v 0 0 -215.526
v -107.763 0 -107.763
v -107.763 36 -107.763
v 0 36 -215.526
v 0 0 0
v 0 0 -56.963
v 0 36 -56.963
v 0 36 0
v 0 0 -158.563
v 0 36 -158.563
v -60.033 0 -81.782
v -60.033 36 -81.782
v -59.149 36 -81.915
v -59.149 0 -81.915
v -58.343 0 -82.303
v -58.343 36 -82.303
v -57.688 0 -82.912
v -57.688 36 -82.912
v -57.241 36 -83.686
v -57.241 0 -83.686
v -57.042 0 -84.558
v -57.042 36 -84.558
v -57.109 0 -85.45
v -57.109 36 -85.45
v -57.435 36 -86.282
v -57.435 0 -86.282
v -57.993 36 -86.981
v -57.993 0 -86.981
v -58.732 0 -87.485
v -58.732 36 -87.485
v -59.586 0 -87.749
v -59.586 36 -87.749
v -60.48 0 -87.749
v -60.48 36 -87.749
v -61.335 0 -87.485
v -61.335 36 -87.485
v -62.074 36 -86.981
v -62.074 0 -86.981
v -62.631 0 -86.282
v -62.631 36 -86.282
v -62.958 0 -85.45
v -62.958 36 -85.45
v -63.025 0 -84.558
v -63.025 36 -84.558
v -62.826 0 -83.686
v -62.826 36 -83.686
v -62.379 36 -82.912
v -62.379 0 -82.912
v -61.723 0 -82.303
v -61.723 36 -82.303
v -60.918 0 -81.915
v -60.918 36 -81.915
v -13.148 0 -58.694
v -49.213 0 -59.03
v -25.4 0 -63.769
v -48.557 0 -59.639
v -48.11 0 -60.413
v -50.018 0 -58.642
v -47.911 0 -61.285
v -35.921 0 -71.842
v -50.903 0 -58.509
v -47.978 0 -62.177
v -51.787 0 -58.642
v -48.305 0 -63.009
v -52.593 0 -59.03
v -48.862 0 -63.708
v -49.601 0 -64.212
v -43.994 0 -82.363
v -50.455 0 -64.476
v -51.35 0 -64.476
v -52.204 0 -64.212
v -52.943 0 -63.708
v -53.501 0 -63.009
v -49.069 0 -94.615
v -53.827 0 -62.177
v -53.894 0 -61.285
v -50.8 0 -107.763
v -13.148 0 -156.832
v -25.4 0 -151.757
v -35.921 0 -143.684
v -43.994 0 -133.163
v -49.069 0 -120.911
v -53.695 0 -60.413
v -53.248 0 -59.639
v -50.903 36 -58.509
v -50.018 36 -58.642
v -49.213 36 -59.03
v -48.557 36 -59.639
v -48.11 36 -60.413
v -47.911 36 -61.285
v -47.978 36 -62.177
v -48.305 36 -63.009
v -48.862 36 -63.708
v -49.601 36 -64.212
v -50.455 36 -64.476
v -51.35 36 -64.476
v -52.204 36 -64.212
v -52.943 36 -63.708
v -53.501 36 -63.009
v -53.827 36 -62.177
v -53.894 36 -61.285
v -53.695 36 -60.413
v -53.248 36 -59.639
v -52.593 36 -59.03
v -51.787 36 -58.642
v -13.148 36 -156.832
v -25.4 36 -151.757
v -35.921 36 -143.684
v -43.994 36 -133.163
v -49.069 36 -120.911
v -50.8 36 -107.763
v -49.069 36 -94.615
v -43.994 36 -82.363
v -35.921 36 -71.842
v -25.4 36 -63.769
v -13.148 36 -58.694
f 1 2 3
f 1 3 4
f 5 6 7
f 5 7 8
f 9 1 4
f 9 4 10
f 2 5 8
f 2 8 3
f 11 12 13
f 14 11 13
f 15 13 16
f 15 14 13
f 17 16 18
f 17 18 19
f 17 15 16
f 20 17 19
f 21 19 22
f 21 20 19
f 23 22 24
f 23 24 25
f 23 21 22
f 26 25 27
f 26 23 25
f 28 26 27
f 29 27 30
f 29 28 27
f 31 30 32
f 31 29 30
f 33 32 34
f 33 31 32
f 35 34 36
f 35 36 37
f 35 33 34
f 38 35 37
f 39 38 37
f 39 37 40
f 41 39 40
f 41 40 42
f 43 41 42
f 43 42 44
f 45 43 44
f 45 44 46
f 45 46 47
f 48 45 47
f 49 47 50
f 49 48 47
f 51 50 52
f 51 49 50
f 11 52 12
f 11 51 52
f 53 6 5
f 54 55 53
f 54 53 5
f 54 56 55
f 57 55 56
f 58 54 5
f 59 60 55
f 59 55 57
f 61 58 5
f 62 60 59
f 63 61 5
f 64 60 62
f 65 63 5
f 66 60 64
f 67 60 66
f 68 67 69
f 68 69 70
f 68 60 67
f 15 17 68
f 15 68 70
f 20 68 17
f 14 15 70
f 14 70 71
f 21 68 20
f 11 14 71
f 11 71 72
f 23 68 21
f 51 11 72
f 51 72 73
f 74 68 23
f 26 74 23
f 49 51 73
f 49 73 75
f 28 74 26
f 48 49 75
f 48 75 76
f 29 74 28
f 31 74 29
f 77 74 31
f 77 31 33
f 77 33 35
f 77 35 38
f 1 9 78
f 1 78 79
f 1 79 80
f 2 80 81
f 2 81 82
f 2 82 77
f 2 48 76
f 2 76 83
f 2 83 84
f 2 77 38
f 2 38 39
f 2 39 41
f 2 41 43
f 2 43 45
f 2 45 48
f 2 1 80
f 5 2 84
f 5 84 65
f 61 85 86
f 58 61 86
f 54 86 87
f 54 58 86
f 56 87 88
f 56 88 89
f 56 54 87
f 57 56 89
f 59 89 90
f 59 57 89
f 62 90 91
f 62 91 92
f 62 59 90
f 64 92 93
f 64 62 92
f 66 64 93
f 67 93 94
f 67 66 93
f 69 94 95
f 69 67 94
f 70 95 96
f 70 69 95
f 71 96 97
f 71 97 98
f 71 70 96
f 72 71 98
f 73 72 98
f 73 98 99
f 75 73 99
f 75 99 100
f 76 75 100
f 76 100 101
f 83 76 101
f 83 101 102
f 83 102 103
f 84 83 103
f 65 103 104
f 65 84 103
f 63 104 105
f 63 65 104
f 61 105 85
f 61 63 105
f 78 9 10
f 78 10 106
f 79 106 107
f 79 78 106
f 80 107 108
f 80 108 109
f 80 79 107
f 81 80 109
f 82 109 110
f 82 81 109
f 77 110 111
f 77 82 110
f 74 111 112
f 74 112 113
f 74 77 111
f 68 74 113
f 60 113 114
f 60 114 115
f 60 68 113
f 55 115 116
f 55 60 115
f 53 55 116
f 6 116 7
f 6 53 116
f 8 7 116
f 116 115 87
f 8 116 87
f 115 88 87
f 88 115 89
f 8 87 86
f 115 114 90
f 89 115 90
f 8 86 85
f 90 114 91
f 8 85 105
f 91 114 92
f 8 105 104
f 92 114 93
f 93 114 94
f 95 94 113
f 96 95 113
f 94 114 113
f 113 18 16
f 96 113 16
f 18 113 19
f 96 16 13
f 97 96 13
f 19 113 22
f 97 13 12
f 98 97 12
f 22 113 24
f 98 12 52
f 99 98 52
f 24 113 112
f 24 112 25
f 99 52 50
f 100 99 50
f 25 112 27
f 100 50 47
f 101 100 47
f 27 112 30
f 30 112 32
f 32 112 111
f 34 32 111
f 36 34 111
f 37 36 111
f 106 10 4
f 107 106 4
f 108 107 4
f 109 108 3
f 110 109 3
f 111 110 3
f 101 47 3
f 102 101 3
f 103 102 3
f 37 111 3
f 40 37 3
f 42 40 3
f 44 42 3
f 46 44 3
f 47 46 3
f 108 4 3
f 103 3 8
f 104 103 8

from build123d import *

# Parameters (mm, degrees)
SKETCH1_R           = 3
BOSS_EXTRUDE1_DEPTH = 36


with BuildPart() as part:
    # Sketch1 → Boss-Extrude1 (new body)
    with BuildSketch(Plane(origin=(0, 0, 0), x_dir=(1, 0, 0), z_dir=(0, 1, 0))):
        with BuildLine():
            Line((0, 0), (-107.763073453, 107.763073453))
            Line((-107.763073453, 107.763073453), (0, 215.526146906))
            Line((0, 215.526146906), (0, 158.563073453))
            ThreePointArc((0, 158.563073453), (-50.8, 107.763073453), (0, 56.963073453))
            Line((0, 56.963073453), (0, 0))
        make_face()
        with Locations(Location((-60.033365723, 84.782103064, 0), (0, 0, 270))):
            Circle(SKETCH1_R, mode=Mode.SUBTRACT)
        with Locations(Location((-50.902581789, 61.509183506, 0), (0, 0, 270))):
            Circle(SKETCH1_R, mode=Mode.SUBTRACT)
    extrude(amount=BOSS_EXTRUDE1_DEPTH)


solid = part.part
